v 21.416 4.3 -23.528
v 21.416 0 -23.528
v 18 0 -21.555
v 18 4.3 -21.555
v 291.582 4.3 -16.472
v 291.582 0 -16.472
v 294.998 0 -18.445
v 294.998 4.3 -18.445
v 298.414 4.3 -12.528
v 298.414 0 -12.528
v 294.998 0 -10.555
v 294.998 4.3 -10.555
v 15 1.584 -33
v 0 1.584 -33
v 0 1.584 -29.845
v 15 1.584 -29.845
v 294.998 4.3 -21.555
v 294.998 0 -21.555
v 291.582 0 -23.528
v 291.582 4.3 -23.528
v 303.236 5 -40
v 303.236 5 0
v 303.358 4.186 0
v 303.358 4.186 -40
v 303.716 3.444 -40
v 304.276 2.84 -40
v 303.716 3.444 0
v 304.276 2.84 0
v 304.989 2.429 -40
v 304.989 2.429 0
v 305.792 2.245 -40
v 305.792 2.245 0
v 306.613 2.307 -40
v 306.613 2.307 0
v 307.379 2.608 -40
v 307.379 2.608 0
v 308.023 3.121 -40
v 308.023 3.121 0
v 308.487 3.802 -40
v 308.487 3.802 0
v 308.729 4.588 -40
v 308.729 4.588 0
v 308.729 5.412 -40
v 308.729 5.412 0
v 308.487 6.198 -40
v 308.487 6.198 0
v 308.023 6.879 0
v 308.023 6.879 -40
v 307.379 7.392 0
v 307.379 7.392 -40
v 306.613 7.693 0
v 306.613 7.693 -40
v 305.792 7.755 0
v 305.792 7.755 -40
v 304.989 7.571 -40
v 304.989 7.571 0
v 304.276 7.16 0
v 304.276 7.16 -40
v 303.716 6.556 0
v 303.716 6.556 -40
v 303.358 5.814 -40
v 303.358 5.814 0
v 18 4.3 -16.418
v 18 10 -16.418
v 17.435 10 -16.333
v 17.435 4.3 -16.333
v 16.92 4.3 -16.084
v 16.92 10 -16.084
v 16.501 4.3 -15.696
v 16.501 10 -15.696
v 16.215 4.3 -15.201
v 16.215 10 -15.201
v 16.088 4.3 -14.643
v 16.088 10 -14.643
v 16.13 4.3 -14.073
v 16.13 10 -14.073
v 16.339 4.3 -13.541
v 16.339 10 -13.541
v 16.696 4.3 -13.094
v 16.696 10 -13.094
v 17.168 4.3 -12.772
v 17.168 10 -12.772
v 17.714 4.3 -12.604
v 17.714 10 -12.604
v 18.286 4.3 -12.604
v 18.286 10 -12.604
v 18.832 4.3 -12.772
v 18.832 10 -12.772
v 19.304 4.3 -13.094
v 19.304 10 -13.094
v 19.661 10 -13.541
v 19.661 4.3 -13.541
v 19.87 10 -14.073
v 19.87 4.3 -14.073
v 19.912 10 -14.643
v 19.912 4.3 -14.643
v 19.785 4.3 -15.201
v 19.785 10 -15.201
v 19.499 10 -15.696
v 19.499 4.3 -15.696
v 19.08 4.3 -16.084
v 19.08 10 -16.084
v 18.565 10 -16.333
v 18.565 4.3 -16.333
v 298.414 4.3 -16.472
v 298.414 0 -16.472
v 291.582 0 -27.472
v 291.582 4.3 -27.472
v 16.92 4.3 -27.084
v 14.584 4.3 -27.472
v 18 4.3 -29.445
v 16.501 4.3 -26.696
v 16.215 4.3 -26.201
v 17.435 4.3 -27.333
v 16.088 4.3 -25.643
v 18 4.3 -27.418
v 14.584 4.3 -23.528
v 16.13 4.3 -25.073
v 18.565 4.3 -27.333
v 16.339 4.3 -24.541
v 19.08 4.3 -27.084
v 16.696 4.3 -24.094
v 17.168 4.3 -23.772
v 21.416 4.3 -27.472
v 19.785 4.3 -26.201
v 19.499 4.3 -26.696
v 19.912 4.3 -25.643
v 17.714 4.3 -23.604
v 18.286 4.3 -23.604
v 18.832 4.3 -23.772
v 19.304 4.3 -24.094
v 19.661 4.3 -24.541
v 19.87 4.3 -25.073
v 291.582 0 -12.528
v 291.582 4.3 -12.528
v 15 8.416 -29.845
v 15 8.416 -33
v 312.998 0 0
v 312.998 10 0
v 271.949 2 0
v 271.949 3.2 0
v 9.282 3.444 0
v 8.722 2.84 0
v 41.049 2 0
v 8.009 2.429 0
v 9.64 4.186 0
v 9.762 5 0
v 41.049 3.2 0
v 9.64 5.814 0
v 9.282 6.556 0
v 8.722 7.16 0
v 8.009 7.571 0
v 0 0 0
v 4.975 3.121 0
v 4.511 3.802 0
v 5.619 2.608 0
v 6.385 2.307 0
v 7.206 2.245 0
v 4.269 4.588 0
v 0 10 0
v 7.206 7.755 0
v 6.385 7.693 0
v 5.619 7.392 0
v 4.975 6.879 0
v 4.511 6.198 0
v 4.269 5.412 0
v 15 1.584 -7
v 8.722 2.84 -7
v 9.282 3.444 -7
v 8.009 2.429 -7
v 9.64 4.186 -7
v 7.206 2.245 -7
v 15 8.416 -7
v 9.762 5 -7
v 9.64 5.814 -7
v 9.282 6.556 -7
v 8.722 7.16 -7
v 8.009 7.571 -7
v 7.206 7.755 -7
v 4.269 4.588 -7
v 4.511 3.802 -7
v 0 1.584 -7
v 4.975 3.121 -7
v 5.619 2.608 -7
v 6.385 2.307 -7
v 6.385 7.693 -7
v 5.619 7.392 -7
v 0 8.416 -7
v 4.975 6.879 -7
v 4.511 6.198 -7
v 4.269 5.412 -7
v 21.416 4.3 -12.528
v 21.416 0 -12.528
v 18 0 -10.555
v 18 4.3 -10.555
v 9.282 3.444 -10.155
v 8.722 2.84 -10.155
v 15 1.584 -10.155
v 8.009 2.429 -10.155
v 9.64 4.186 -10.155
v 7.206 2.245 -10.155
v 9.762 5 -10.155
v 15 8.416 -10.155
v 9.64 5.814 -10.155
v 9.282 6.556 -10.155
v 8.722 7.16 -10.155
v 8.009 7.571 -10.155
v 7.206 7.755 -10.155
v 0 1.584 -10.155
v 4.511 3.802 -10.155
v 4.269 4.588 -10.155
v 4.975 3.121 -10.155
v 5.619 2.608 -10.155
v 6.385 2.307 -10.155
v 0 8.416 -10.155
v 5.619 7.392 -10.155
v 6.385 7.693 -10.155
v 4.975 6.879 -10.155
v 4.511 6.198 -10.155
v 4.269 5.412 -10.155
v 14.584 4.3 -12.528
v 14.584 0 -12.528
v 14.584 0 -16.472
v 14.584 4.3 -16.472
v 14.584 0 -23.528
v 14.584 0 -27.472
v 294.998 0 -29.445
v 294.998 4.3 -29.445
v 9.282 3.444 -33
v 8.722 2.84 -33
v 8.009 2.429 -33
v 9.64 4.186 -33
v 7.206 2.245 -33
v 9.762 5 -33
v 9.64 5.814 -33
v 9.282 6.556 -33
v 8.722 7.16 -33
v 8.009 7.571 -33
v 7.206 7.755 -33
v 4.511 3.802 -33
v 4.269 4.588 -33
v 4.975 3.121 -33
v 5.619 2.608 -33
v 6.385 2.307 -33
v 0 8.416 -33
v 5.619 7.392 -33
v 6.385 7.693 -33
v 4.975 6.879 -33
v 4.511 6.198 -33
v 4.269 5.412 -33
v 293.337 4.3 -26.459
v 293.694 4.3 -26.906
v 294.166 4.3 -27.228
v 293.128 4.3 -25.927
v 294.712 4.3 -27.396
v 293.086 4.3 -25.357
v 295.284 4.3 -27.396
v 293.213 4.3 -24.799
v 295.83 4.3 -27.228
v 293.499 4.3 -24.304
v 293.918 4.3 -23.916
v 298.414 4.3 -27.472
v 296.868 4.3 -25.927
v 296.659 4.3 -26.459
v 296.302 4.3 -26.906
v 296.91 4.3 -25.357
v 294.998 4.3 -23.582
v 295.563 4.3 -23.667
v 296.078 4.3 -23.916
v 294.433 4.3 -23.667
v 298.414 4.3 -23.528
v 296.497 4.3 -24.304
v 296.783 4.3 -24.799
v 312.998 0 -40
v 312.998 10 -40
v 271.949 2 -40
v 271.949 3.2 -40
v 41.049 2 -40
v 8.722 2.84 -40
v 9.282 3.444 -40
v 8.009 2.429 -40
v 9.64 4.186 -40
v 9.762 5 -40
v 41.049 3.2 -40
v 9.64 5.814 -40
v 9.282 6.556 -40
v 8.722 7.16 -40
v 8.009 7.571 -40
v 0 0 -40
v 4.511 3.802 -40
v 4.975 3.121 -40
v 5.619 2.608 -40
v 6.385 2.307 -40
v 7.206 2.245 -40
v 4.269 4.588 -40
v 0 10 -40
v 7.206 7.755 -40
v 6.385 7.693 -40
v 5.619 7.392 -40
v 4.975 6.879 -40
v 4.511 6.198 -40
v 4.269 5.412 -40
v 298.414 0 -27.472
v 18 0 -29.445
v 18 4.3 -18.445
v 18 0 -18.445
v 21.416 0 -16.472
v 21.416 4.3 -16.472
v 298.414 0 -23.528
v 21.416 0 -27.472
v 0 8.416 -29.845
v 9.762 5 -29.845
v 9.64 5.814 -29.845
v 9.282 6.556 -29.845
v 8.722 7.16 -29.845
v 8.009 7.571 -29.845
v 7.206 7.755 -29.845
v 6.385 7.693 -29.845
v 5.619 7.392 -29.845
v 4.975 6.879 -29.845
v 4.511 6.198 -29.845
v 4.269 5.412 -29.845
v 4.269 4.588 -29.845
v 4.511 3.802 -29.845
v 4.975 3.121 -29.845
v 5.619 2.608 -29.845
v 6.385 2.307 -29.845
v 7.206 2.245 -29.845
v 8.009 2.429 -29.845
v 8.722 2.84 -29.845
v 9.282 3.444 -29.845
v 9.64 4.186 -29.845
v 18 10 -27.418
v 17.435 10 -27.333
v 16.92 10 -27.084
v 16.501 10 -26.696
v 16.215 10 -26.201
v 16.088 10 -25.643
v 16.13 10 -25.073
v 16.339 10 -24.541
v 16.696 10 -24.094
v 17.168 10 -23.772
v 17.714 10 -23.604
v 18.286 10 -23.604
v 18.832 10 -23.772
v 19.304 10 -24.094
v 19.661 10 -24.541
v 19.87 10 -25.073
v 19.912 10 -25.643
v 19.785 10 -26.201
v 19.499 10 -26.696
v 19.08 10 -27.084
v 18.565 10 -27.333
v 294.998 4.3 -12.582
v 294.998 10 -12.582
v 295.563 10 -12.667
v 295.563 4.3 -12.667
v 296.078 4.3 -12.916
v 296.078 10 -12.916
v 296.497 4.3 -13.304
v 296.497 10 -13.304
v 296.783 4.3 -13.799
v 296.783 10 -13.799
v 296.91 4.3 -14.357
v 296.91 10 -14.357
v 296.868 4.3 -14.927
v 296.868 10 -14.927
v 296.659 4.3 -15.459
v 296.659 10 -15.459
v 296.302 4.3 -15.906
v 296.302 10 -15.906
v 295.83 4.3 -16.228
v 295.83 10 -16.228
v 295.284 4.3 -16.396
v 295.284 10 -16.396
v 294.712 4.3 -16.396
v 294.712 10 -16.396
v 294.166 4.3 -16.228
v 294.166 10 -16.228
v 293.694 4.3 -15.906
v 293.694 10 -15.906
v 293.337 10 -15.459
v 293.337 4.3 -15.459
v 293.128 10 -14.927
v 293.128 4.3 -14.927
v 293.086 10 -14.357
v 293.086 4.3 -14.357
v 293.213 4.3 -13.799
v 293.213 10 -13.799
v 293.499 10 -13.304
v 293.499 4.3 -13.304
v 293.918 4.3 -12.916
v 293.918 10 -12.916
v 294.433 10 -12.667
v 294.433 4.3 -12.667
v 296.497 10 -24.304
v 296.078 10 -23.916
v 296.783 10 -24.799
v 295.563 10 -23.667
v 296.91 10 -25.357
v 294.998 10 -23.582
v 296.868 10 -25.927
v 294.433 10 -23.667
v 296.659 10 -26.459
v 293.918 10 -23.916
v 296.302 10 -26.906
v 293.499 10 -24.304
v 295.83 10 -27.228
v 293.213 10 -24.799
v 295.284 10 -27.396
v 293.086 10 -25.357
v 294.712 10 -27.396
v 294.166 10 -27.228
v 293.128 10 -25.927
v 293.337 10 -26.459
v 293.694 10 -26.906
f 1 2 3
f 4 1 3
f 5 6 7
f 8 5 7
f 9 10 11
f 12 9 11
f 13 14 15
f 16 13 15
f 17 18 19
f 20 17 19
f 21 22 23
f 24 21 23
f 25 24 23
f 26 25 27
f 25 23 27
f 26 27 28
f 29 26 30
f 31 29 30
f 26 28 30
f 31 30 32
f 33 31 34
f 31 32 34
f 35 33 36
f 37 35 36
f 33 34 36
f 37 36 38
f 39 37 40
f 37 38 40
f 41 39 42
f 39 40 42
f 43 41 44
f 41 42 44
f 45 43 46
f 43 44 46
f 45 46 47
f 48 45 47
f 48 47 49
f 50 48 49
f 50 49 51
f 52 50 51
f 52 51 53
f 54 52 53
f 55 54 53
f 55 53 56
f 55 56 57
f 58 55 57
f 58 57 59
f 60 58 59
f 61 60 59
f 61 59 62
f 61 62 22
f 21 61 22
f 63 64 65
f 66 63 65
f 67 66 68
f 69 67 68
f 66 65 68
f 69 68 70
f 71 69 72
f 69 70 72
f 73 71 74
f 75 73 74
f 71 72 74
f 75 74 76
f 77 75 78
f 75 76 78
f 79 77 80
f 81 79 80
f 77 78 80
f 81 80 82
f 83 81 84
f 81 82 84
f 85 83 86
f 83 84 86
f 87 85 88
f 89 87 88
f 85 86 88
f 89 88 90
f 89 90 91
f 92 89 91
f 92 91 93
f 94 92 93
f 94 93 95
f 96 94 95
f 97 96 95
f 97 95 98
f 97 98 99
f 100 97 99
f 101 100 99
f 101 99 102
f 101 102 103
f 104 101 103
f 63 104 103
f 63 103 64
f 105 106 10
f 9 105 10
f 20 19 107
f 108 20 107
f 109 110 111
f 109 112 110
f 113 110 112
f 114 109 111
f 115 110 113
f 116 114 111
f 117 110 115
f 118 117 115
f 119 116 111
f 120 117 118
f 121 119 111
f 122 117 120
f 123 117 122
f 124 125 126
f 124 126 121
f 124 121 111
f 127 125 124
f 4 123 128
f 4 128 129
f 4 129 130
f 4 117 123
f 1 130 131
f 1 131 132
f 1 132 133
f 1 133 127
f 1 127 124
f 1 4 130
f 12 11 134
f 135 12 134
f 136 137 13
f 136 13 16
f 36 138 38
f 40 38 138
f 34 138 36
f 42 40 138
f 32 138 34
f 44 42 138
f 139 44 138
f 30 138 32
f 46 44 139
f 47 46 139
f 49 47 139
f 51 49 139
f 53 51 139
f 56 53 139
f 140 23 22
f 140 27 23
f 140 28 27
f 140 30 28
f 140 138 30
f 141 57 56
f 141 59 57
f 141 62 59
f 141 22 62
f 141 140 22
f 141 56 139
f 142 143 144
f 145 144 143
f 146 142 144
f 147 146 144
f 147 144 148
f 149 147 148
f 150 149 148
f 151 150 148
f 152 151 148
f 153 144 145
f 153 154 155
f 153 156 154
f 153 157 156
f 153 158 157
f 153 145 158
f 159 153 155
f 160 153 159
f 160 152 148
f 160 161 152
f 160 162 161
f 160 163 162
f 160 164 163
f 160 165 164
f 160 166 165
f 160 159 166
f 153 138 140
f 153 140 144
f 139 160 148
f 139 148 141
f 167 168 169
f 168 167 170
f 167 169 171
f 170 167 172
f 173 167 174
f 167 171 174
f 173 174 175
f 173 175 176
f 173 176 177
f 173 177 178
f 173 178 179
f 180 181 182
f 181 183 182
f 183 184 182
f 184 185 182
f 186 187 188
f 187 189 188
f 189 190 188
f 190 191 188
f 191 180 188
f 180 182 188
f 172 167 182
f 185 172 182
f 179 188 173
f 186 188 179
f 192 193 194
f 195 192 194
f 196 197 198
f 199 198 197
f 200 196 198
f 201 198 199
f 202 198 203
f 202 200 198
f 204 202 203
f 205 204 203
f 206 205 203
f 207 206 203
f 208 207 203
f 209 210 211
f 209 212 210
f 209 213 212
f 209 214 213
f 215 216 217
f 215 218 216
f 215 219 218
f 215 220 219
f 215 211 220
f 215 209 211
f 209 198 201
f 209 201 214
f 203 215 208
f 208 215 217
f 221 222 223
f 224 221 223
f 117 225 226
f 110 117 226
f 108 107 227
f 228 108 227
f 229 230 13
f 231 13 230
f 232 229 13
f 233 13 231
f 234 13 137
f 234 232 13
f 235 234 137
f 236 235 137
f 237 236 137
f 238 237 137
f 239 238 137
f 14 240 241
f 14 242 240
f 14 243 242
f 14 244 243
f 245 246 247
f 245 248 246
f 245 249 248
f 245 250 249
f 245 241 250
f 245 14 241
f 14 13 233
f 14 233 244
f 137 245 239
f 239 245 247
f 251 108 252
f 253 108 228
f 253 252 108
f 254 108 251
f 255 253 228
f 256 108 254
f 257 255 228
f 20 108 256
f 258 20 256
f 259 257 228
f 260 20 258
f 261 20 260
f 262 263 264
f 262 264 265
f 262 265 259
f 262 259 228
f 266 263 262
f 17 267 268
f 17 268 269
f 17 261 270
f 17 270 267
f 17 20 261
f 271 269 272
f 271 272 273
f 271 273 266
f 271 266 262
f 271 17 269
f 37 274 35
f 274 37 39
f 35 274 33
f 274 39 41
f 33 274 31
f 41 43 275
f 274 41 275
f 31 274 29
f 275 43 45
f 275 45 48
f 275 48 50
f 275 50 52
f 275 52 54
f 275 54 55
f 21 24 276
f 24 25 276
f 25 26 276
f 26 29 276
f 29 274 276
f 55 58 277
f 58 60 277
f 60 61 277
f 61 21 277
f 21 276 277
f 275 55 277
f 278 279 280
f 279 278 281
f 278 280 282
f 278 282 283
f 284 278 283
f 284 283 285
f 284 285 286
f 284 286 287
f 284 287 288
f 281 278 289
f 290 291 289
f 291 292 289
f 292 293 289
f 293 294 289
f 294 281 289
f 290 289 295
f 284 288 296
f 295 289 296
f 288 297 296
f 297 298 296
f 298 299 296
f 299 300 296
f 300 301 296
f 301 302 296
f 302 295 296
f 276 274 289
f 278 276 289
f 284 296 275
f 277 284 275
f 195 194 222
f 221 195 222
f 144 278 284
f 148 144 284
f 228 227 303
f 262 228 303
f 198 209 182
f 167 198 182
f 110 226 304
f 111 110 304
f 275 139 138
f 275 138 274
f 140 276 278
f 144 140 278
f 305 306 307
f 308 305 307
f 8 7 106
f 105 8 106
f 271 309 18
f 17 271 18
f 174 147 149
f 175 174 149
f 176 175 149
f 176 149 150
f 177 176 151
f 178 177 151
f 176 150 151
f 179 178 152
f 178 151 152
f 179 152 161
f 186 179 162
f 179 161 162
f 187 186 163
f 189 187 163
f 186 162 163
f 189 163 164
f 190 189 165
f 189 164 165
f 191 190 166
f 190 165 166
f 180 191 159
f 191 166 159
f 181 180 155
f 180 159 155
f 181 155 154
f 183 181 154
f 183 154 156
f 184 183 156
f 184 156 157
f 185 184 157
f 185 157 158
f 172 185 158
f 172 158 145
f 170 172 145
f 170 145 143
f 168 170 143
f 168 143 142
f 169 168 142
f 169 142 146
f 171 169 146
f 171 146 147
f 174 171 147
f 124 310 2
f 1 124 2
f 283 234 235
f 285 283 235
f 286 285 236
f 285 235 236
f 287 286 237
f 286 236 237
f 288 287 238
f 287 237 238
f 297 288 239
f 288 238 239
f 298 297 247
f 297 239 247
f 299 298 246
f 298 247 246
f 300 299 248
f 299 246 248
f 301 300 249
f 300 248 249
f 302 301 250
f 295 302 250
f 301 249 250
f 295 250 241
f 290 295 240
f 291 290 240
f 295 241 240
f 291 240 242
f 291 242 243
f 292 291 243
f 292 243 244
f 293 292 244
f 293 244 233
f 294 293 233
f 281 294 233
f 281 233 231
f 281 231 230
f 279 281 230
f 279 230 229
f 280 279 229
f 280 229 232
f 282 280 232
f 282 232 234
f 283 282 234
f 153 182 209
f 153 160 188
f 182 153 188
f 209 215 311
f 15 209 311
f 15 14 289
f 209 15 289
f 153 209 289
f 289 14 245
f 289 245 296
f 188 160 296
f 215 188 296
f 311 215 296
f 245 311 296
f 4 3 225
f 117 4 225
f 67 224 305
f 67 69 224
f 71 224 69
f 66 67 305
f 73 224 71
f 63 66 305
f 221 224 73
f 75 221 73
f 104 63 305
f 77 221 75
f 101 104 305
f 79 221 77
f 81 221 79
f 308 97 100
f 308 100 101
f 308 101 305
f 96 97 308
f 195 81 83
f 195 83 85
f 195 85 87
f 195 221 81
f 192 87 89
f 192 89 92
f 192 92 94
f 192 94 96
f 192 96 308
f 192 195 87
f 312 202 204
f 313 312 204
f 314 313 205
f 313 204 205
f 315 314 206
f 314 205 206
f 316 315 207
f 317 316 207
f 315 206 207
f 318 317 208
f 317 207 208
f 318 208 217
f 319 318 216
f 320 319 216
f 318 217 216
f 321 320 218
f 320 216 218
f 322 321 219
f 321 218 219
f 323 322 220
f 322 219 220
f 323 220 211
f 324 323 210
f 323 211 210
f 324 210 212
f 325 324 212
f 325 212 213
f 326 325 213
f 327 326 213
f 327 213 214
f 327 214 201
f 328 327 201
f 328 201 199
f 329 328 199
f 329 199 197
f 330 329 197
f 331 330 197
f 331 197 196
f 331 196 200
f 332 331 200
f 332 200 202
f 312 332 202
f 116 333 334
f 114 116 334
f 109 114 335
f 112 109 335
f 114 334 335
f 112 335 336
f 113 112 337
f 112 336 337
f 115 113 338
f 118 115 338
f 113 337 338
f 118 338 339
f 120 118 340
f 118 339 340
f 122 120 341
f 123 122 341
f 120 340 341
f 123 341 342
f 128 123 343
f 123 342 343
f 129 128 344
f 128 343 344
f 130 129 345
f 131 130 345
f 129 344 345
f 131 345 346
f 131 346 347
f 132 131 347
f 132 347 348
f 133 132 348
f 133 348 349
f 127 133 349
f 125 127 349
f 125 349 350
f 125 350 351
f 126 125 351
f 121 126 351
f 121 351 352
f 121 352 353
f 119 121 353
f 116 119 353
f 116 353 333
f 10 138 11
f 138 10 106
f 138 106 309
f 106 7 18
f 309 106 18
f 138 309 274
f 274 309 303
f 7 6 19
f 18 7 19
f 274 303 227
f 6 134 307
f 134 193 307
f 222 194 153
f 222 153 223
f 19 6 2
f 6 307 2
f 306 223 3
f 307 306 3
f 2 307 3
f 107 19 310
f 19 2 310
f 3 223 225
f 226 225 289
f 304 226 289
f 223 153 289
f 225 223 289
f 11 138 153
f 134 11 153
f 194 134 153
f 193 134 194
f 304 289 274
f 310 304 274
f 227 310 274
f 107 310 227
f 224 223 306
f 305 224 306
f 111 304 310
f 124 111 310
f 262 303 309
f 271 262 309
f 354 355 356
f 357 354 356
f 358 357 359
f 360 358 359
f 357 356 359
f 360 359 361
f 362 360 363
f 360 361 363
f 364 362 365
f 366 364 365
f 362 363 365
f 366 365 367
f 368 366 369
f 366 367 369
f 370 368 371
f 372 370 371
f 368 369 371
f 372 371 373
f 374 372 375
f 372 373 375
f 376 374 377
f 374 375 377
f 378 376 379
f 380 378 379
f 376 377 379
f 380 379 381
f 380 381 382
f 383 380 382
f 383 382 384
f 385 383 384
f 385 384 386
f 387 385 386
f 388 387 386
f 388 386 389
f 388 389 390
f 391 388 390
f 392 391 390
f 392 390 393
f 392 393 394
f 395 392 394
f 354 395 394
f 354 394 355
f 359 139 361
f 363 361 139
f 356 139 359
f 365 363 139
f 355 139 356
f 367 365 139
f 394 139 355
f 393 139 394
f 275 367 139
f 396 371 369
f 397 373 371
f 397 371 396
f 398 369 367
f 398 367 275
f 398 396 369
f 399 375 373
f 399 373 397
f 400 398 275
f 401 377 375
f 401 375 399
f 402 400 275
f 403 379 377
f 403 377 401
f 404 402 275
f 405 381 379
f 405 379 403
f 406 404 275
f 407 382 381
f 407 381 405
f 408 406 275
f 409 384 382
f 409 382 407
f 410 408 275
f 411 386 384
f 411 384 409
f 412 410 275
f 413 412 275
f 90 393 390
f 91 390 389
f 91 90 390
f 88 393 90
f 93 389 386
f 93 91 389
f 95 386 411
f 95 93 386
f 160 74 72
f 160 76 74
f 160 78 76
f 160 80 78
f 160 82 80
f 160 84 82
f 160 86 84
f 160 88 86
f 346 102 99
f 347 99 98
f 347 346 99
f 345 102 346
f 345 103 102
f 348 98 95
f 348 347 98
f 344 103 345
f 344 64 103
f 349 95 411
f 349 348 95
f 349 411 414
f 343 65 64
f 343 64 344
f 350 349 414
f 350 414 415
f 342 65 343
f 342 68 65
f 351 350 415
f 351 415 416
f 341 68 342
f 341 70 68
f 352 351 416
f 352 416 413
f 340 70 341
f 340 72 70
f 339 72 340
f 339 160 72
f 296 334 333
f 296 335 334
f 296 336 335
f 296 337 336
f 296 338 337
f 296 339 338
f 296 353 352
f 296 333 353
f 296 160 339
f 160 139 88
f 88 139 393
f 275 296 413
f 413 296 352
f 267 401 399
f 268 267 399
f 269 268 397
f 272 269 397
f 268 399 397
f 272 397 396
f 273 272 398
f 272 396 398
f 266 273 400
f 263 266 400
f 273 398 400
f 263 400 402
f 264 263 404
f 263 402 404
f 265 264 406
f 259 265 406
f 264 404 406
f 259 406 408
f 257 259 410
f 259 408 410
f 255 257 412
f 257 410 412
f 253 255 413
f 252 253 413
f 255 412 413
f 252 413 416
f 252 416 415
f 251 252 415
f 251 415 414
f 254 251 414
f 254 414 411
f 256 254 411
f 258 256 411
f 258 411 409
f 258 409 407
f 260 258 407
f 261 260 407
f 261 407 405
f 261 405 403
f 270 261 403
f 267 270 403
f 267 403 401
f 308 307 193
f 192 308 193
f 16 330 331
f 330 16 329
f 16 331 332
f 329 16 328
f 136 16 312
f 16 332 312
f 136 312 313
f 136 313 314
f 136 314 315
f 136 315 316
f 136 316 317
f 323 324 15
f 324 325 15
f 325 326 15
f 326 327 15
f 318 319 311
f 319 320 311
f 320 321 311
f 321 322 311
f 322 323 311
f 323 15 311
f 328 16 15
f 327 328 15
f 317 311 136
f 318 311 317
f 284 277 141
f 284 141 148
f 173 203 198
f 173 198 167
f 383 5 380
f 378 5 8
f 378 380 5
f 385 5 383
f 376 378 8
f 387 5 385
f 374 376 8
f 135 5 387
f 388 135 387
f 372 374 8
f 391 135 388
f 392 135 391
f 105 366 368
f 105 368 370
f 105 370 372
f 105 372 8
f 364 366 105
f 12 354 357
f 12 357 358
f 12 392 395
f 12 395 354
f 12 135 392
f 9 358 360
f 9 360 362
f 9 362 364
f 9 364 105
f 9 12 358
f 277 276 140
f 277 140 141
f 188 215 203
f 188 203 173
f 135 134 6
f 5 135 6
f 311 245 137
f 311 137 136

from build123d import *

# Parameters (mm, degrees)
SKETCH1_W           = 40
SKETCH1_H           = 10
BOSS_EXTRUDE1_DEPTH = 312.997959
SKETCH2_W           = 230.9
SKETCH2_H           = 1.2
CUT_EXTRUDE1_DEPTH  = 316.701951749
SKETCH3_R           = 1.9177
CUT_EXTRUDE2_DEPTH  = 316.701951749
CUT_EXTRUDE3_DEPTH  = 4.3
SKETCH5_R           = 2.762258299
CUT_EXTRUDE4_DEPTH  = 316.701951749
SKETCH6_W           = 3.15468
SKETCH6_H           = 6.8326
CUT_EXTRUDE5_DEPTH  = 15


with BuildPart() as part:
    # Sketch1 → Boss-Extrude1 (new body)
    with BuildSketch(Plane(origin=(0, 0, 0), x_dir=(0, 0, -1), z_dir=(1, 0, 0))):
        with Locations((20, 5)):
            Rectangle(SKETCH1_W, SKETCH1_H)
    extrude(amount=BOSS_EXTRUDE1_DEPTH)

    # Sketch2 → Cut-Extrude1 (cut, through all)
    with BuildSketch(Plane(origin=(0, 0, -40), x_dir=(-1, 0, 0), z_dir=(0, 0, -1))):
        with Locations((-156.4989795, 2.6)):
            Rectangle(SKETCH2_W, SKETCH2_H)
    extrude(amount=-CUT_EXTRUDE1_DEPTH, mode=Mode.SUBTRACT)

    # Sketch3 → Cut-Extrude2 (cut, through all)
    with BuildSketch(Plane(origin=(0, 10, 0), x_dir=(1, 0, 0), z_dir=(0, 1, 0))):
        with Locations(Location((294.997959, 25.5, 0), (0, 0, 270))):
            Circle(SKETCH3_R)
        with Locations(Location((294.997959, 14.5, 0), (0, 0, 270))):
            Circle(SKETCH3_R)
        with Locations(Location((18, 14.5, 0), (0, 0, 90))):
            Circle(SKETCH3_R)
        with Locations(Location((18, 25.5, 0), (0, 0, 90))):
            Circle(SKETCH3_R)
    extrude(amount=-CUT_EXTRUDE2_DEPTH, mode=Mode.SUBTRACT)

    # Sketch4 → Cut-Extrude3 (cut)
    with BuildSketch(Plane.XZ):
        Polygon((14.5837, -12.527598275), (14.5837, -16.472401725), (18, -18.444803449), (21.4163, -16.472401725), (21.4163, -12.527598275), (18, -10.555196551), align=None)
        Polygon((14.5837, -23.527598275), (14.5837, -27.472401725), (18, -29.444803449), (21.4163, -27.472401725), (21.4163, -23.527598275), (18, -21.555196551), align=None)
        Polygon((298.414259, -12.527598275), (294.997959, -10.555196551), (291.581659, -12.527598275), (291.581659, -16.472401725), (294.997959, -18.444803449), (298.414259, -16.472401725), align=None)
        Polygon((291.581659, -23.527598275), (291.581659, -27.472401725), (294.997959, -29.444803449), (298.414259, -27.472401725), (298.414259, -23.527598275), (294.997959, -21.555196551), align=None)
    extrude(amount=-CUT_EXTRUDE3_DEPTH, mode=Mode.SUBTRACT)

    # Sketch5 → Cut-Extrude4 (cut, through all)
    with BuildSketch(Plane.XY):
        with Locations((7, 5)):
            Circle(SKETCH5_R)
        with Locations(Location((305.997959, 5, 0), (0, 0, 180))):
            Circle(SKETCH5_R)
    extrude(amount=-CUT_EXTRUDE4_DEPTH, mode=Mode.SUBTRACT)

    # Sketch6 → Cut-Extrude5 (cut)
    with BuildSketch(Plane.ZY):
        with Locations((-31.42266, 5)):
            Rectangle(SKETCH6_W, SKETCH6_H)
        with Locations((-8.57734, 5)):
            Rectangle(SKETCH6_W, SKETCH6_H)
    extrude(amount=-CUT_EXTRUDE5_DEPTH, mode=Mode.SUBTRACT)


solid = part.part
